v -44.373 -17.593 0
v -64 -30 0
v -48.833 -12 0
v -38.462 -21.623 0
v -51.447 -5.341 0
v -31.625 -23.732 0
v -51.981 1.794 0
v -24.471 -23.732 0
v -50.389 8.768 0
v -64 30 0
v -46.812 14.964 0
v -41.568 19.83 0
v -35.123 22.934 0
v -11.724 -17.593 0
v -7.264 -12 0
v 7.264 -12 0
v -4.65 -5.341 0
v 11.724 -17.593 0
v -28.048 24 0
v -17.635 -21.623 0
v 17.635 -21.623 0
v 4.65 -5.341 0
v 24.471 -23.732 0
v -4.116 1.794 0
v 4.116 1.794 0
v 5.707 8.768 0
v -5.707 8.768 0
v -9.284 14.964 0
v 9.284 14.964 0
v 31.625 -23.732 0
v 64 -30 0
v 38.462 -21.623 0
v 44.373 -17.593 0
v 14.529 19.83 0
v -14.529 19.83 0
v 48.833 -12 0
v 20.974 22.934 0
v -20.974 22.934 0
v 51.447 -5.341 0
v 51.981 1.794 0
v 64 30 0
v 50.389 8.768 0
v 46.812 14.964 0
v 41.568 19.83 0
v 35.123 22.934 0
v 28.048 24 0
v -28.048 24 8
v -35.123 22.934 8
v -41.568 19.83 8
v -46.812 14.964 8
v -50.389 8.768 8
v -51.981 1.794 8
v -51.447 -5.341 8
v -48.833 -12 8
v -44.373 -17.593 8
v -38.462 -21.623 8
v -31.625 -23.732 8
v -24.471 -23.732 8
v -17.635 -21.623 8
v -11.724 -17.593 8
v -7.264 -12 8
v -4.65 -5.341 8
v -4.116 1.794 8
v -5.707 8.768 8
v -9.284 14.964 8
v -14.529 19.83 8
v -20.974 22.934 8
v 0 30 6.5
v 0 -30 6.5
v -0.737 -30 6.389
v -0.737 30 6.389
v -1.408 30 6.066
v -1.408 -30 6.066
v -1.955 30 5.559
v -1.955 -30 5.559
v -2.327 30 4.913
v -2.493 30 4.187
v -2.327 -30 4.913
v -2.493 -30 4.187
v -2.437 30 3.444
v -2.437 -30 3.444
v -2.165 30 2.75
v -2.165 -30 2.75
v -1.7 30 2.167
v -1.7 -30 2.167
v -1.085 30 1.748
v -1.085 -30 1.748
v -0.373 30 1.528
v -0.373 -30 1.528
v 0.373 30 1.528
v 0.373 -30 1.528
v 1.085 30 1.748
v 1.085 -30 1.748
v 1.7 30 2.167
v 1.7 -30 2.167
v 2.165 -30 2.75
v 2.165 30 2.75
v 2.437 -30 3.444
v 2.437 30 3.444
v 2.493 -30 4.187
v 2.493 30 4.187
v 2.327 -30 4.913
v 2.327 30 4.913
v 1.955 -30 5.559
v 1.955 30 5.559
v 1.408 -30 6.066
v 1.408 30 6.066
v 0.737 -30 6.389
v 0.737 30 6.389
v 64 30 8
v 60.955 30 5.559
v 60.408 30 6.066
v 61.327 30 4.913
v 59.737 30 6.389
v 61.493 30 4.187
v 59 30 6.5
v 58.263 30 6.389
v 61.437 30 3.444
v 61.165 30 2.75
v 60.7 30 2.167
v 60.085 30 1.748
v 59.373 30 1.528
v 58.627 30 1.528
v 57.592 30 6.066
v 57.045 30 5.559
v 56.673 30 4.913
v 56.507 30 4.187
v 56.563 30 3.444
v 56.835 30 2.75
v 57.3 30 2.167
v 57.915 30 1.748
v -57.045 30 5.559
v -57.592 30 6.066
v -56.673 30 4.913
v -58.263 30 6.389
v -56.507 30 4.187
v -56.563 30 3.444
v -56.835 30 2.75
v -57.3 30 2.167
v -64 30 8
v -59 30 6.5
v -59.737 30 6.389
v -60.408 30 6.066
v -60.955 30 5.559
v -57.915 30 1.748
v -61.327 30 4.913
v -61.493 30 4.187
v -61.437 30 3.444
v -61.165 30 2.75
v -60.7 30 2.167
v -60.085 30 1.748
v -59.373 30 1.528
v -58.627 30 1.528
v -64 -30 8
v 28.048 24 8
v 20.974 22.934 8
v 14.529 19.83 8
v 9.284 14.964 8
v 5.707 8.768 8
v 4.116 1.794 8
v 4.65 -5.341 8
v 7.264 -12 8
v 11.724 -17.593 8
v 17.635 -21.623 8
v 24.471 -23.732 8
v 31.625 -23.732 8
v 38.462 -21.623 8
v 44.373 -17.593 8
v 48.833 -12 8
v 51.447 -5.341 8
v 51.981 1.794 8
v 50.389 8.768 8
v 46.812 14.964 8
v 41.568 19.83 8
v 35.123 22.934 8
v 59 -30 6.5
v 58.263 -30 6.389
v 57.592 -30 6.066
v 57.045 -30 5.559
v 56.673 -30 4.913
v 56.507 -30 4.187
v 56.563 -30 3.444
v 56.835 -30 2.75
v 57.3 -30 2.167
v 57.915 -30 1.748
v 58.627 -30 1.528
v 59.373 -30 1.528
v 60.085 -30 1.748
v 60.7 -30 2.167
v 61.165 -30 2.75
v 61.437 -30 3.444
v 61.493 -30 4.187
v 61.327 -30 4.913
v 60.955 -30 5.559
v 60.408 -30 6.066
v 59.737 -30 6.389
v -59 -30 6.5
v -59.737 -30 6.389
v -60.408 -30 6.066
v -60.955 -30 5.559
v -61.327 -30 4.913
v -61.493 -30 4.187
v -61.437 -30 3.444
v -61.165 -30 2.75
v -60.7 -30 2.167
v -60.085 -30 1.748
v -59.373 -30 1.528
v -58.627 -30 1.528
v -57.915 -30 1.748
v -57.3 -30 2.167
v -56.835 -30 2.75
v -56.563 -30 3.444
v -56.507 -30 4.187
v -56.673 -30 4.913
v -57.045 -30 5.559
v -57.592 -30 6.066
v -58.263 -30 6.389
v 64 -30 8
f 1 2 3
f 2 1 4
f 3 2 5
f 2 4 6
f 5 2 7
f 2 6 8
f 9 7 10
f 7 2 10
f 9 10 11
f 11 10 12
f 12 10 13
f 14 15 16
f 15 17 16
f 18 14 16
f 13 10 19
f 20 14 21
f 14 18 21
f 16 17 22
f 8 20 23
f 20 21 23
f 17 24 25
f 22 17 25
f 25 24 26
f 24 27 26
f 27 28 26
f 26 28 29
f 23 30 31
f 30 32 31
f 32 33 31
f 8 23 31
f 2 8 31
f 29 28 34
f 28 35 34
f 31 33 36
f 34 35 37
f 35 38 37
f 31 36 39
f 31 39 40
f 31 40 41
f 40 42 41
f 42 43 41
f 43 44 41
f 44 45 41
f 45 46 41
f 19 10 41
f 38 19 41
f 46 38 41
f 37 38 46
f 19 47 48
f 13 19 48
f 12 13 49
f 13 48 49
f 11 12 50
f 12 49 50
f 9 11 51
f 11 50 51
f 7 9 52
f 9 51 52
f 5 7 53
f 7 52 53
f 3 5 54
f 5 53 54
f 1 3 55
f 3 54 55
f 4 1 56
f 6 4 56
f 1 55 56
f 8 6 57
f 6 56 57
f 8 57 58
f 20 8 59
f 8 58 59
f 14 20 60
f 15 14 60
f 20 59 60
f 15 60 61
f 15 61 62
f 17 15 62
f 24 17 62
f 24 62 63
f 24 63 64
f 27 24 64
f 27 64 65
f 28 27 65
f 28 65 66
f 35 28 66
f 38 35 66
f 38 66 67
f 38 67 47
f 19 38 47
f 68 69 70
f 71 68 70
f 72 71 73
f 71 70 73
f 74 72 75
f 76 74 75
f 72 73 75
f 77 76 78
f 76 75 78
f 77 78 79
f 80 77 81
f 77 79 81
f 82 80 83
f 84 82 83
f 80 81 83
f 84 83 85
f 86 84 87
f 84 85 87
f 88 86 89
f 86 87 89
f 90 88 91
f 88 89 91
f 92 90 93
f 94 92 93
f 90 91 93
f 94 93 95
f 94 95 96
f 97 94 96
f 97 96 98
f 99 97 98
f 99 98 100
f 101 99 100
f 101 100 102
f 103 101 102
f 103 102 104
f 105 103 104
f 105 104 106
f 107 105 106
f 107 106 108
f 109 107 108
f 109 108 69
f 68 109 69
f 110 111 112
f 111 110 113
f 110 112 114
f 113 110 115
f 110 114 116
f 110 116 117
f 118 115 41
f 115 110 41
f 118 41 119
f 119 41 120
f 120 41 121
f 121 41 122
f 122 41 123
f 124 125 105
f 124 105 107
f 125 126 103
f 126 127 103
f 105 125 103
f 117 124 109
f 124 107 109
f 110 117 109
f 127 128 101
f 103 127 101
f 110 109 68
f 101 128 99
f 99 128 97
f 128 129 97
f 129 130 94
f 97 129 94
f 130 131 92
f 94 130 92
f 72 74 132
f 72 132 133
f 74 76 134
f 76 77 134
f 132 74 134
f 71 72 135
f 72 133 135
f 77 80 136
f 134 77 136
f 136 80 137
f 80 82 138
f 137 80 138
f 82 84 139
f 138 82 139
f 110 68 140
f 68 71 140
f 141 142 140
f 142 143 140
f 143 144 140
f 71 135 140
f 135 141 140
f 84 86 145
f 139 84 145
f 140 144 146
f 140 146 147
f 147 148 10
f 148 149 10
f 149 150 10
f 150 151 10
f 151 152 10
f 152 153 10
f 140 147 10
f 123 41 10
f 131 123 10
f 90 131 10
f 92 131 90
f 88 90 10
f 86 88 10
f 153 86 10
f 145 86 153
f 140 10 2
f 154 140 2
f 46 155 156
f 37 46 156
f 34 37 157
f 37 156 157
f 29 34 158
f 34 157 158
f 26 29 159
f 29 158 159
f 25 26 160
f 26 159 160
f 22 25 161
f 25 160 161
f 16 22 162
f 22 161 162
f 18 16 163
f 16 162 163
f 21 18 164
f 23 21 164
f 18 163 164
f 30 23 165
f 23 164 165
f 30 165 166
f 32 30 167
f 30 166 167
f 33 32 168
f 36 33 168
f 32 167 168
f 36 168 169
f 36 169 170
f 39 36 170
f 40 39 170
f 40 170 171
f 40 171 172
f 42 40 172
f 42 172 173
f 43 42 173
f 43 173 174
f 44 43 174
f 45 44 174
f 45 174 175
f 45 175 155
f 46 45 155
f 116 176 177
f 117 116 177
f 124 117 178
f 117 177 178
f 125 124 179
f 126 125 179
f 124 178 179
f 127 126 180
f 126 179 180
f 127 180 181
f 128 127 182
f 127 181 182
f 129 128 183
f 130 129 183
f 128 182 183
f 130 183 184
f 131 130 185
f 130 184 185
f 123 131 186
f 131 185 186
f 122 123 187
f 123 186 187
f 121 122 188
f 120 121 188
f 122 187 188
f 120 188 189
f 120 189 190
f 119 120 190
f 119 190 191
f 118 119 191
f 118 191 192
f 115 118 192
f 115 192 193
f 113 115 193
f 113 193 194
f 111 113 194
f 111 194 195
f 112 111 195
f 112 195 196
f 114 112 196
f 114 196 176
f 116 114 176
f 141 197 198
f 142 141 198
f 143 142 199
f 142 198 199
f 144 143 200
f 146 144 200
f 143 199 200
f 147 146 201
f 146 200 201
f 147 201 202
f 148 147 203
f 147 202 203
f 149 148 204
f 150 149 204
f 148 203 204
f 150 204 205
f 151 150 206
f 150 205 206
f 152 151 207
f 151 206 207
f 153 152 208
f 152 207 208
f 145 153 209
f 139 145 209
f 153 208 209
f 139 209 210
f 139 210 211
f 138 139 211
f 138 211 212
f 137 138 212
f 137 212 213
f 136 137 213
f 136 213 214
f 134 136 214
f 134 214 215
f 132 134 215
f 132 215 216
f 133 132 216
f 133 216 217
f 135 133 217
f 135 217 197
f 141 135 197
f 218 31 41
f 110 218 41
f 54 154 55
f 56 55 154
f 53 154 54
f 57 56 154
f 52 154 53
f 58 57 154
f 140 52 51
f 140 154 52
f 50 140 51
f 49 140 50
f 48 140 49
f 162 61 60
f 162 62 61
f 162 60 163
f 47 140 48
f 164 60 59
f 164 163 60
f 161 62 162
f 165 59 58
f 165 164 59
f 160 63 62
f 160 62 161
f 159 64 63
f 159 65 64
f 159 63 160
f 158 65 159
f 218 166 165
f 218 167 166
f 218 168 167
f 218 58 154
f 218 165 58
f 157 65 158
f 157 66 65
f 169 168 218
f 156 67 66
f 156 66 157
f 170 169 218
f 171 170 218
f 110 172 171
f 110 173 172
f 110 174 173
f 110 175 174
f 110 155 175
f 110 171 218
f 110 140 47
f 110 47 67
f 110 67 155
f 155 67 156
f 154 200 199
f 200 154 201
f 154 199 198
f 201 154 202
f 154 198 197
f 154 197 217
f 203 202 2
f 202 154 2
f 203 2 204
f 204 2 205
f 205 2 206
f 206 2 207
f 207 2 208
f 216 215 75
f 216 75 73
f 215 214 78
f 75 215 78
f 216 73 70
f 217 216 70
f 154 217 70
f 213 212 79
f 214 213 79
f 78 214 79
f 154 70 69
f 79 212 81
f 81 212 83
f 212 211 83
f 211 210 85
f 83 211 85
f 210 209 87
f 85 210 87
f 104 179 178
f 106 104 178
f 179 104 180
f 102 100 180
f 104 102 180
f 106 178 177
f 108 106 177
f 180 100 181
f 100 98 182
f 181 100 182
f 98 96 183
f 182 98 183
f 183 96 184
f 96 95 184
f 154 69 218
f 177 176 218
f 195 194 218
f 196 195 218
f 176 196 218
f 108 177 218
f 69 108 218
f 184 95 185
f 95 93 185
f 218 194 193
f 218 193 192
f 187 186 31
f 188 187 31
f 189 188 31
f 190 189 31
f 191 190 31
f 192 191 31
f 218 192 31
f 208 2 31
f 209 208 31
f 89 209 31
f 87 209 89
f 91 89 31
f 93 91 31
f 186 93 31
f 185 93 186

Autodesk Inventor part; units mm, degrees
ref_plane "YZ Plane" through (0, 0, 0) normal (1, 0, 0) x (0, 1, 0)
ref_plane "XZ Plane" through (0, 0, 0) normal (0, 1, 0) x (-1, 0, 0)
ref_plane "XY Plane" through (0, 0, 0) normal (0, 0, 1) x (1, 0, 0)
sketch "Sketch1" plane through (0, 0, 0) normal (0, 0, 1) x (1, 0, 0)
  line L0 (-64, -30) -> (64, -30)
  line L1 (64, -30) -> (64, 30)
  line L2 (64, 30) -> (-64, 30)
  line L3 (-64, 30) -> (-64, -30)
  line L4 (-64, -30) -> (64, 30) construction
  line L5 (64, -30) -> (-64, 30) construction
  point P0 (0, 0)
  dimension "d0" = 128
  dimension "d1" = 60
extrude "Extrusion1" add sketch "Sketch1" along normal blind 8
sketch "Sketch2" plane through (-64, 30, 0) normal (0, 1, 0) x (1, 0, 0)
  line L0 (128, 0) -> (0, 0) projected
  line L1 (0, 0) -> (0, -8) projected
  line L2 (128, -8) -> (0, -8) projected
  line L3 (128, 0) -> (128, -8) projected
  point P0 (64, 0)
  point P1 (5, -4)
  point P2 (123, -4)
  point P3 (64, -4)
  dimension "d4" = 5
  dimension "d5" = 5
hole "Hole1" at (-59, 30, 4) at (59, 30, 4) at (0, 30, 4) direction (0, -1, 0) diameter 5 end through all
sketch "Sketch3" plane through (-64, -30, 0) normal (0, -1, 0) x (1, 0, 0)
  point P0 (64, 0)
sketch "Sketch4" plane through (0, 0, 0) normal (0, 0, -1) x (-1, 0, 0)
  line L0 (0, 0) -> (0, 24.6794) construction
  point P0 (-28.0484, 0)
  point P1 (28.0484, 0)
hole "Hole2" at (-28.0484, 0, 0) at (28.0484, 0, 0) direction (0, 0, 1) diameter 48 end through all
equation "\"d5\" = d4"
properties part number "Separator1"
